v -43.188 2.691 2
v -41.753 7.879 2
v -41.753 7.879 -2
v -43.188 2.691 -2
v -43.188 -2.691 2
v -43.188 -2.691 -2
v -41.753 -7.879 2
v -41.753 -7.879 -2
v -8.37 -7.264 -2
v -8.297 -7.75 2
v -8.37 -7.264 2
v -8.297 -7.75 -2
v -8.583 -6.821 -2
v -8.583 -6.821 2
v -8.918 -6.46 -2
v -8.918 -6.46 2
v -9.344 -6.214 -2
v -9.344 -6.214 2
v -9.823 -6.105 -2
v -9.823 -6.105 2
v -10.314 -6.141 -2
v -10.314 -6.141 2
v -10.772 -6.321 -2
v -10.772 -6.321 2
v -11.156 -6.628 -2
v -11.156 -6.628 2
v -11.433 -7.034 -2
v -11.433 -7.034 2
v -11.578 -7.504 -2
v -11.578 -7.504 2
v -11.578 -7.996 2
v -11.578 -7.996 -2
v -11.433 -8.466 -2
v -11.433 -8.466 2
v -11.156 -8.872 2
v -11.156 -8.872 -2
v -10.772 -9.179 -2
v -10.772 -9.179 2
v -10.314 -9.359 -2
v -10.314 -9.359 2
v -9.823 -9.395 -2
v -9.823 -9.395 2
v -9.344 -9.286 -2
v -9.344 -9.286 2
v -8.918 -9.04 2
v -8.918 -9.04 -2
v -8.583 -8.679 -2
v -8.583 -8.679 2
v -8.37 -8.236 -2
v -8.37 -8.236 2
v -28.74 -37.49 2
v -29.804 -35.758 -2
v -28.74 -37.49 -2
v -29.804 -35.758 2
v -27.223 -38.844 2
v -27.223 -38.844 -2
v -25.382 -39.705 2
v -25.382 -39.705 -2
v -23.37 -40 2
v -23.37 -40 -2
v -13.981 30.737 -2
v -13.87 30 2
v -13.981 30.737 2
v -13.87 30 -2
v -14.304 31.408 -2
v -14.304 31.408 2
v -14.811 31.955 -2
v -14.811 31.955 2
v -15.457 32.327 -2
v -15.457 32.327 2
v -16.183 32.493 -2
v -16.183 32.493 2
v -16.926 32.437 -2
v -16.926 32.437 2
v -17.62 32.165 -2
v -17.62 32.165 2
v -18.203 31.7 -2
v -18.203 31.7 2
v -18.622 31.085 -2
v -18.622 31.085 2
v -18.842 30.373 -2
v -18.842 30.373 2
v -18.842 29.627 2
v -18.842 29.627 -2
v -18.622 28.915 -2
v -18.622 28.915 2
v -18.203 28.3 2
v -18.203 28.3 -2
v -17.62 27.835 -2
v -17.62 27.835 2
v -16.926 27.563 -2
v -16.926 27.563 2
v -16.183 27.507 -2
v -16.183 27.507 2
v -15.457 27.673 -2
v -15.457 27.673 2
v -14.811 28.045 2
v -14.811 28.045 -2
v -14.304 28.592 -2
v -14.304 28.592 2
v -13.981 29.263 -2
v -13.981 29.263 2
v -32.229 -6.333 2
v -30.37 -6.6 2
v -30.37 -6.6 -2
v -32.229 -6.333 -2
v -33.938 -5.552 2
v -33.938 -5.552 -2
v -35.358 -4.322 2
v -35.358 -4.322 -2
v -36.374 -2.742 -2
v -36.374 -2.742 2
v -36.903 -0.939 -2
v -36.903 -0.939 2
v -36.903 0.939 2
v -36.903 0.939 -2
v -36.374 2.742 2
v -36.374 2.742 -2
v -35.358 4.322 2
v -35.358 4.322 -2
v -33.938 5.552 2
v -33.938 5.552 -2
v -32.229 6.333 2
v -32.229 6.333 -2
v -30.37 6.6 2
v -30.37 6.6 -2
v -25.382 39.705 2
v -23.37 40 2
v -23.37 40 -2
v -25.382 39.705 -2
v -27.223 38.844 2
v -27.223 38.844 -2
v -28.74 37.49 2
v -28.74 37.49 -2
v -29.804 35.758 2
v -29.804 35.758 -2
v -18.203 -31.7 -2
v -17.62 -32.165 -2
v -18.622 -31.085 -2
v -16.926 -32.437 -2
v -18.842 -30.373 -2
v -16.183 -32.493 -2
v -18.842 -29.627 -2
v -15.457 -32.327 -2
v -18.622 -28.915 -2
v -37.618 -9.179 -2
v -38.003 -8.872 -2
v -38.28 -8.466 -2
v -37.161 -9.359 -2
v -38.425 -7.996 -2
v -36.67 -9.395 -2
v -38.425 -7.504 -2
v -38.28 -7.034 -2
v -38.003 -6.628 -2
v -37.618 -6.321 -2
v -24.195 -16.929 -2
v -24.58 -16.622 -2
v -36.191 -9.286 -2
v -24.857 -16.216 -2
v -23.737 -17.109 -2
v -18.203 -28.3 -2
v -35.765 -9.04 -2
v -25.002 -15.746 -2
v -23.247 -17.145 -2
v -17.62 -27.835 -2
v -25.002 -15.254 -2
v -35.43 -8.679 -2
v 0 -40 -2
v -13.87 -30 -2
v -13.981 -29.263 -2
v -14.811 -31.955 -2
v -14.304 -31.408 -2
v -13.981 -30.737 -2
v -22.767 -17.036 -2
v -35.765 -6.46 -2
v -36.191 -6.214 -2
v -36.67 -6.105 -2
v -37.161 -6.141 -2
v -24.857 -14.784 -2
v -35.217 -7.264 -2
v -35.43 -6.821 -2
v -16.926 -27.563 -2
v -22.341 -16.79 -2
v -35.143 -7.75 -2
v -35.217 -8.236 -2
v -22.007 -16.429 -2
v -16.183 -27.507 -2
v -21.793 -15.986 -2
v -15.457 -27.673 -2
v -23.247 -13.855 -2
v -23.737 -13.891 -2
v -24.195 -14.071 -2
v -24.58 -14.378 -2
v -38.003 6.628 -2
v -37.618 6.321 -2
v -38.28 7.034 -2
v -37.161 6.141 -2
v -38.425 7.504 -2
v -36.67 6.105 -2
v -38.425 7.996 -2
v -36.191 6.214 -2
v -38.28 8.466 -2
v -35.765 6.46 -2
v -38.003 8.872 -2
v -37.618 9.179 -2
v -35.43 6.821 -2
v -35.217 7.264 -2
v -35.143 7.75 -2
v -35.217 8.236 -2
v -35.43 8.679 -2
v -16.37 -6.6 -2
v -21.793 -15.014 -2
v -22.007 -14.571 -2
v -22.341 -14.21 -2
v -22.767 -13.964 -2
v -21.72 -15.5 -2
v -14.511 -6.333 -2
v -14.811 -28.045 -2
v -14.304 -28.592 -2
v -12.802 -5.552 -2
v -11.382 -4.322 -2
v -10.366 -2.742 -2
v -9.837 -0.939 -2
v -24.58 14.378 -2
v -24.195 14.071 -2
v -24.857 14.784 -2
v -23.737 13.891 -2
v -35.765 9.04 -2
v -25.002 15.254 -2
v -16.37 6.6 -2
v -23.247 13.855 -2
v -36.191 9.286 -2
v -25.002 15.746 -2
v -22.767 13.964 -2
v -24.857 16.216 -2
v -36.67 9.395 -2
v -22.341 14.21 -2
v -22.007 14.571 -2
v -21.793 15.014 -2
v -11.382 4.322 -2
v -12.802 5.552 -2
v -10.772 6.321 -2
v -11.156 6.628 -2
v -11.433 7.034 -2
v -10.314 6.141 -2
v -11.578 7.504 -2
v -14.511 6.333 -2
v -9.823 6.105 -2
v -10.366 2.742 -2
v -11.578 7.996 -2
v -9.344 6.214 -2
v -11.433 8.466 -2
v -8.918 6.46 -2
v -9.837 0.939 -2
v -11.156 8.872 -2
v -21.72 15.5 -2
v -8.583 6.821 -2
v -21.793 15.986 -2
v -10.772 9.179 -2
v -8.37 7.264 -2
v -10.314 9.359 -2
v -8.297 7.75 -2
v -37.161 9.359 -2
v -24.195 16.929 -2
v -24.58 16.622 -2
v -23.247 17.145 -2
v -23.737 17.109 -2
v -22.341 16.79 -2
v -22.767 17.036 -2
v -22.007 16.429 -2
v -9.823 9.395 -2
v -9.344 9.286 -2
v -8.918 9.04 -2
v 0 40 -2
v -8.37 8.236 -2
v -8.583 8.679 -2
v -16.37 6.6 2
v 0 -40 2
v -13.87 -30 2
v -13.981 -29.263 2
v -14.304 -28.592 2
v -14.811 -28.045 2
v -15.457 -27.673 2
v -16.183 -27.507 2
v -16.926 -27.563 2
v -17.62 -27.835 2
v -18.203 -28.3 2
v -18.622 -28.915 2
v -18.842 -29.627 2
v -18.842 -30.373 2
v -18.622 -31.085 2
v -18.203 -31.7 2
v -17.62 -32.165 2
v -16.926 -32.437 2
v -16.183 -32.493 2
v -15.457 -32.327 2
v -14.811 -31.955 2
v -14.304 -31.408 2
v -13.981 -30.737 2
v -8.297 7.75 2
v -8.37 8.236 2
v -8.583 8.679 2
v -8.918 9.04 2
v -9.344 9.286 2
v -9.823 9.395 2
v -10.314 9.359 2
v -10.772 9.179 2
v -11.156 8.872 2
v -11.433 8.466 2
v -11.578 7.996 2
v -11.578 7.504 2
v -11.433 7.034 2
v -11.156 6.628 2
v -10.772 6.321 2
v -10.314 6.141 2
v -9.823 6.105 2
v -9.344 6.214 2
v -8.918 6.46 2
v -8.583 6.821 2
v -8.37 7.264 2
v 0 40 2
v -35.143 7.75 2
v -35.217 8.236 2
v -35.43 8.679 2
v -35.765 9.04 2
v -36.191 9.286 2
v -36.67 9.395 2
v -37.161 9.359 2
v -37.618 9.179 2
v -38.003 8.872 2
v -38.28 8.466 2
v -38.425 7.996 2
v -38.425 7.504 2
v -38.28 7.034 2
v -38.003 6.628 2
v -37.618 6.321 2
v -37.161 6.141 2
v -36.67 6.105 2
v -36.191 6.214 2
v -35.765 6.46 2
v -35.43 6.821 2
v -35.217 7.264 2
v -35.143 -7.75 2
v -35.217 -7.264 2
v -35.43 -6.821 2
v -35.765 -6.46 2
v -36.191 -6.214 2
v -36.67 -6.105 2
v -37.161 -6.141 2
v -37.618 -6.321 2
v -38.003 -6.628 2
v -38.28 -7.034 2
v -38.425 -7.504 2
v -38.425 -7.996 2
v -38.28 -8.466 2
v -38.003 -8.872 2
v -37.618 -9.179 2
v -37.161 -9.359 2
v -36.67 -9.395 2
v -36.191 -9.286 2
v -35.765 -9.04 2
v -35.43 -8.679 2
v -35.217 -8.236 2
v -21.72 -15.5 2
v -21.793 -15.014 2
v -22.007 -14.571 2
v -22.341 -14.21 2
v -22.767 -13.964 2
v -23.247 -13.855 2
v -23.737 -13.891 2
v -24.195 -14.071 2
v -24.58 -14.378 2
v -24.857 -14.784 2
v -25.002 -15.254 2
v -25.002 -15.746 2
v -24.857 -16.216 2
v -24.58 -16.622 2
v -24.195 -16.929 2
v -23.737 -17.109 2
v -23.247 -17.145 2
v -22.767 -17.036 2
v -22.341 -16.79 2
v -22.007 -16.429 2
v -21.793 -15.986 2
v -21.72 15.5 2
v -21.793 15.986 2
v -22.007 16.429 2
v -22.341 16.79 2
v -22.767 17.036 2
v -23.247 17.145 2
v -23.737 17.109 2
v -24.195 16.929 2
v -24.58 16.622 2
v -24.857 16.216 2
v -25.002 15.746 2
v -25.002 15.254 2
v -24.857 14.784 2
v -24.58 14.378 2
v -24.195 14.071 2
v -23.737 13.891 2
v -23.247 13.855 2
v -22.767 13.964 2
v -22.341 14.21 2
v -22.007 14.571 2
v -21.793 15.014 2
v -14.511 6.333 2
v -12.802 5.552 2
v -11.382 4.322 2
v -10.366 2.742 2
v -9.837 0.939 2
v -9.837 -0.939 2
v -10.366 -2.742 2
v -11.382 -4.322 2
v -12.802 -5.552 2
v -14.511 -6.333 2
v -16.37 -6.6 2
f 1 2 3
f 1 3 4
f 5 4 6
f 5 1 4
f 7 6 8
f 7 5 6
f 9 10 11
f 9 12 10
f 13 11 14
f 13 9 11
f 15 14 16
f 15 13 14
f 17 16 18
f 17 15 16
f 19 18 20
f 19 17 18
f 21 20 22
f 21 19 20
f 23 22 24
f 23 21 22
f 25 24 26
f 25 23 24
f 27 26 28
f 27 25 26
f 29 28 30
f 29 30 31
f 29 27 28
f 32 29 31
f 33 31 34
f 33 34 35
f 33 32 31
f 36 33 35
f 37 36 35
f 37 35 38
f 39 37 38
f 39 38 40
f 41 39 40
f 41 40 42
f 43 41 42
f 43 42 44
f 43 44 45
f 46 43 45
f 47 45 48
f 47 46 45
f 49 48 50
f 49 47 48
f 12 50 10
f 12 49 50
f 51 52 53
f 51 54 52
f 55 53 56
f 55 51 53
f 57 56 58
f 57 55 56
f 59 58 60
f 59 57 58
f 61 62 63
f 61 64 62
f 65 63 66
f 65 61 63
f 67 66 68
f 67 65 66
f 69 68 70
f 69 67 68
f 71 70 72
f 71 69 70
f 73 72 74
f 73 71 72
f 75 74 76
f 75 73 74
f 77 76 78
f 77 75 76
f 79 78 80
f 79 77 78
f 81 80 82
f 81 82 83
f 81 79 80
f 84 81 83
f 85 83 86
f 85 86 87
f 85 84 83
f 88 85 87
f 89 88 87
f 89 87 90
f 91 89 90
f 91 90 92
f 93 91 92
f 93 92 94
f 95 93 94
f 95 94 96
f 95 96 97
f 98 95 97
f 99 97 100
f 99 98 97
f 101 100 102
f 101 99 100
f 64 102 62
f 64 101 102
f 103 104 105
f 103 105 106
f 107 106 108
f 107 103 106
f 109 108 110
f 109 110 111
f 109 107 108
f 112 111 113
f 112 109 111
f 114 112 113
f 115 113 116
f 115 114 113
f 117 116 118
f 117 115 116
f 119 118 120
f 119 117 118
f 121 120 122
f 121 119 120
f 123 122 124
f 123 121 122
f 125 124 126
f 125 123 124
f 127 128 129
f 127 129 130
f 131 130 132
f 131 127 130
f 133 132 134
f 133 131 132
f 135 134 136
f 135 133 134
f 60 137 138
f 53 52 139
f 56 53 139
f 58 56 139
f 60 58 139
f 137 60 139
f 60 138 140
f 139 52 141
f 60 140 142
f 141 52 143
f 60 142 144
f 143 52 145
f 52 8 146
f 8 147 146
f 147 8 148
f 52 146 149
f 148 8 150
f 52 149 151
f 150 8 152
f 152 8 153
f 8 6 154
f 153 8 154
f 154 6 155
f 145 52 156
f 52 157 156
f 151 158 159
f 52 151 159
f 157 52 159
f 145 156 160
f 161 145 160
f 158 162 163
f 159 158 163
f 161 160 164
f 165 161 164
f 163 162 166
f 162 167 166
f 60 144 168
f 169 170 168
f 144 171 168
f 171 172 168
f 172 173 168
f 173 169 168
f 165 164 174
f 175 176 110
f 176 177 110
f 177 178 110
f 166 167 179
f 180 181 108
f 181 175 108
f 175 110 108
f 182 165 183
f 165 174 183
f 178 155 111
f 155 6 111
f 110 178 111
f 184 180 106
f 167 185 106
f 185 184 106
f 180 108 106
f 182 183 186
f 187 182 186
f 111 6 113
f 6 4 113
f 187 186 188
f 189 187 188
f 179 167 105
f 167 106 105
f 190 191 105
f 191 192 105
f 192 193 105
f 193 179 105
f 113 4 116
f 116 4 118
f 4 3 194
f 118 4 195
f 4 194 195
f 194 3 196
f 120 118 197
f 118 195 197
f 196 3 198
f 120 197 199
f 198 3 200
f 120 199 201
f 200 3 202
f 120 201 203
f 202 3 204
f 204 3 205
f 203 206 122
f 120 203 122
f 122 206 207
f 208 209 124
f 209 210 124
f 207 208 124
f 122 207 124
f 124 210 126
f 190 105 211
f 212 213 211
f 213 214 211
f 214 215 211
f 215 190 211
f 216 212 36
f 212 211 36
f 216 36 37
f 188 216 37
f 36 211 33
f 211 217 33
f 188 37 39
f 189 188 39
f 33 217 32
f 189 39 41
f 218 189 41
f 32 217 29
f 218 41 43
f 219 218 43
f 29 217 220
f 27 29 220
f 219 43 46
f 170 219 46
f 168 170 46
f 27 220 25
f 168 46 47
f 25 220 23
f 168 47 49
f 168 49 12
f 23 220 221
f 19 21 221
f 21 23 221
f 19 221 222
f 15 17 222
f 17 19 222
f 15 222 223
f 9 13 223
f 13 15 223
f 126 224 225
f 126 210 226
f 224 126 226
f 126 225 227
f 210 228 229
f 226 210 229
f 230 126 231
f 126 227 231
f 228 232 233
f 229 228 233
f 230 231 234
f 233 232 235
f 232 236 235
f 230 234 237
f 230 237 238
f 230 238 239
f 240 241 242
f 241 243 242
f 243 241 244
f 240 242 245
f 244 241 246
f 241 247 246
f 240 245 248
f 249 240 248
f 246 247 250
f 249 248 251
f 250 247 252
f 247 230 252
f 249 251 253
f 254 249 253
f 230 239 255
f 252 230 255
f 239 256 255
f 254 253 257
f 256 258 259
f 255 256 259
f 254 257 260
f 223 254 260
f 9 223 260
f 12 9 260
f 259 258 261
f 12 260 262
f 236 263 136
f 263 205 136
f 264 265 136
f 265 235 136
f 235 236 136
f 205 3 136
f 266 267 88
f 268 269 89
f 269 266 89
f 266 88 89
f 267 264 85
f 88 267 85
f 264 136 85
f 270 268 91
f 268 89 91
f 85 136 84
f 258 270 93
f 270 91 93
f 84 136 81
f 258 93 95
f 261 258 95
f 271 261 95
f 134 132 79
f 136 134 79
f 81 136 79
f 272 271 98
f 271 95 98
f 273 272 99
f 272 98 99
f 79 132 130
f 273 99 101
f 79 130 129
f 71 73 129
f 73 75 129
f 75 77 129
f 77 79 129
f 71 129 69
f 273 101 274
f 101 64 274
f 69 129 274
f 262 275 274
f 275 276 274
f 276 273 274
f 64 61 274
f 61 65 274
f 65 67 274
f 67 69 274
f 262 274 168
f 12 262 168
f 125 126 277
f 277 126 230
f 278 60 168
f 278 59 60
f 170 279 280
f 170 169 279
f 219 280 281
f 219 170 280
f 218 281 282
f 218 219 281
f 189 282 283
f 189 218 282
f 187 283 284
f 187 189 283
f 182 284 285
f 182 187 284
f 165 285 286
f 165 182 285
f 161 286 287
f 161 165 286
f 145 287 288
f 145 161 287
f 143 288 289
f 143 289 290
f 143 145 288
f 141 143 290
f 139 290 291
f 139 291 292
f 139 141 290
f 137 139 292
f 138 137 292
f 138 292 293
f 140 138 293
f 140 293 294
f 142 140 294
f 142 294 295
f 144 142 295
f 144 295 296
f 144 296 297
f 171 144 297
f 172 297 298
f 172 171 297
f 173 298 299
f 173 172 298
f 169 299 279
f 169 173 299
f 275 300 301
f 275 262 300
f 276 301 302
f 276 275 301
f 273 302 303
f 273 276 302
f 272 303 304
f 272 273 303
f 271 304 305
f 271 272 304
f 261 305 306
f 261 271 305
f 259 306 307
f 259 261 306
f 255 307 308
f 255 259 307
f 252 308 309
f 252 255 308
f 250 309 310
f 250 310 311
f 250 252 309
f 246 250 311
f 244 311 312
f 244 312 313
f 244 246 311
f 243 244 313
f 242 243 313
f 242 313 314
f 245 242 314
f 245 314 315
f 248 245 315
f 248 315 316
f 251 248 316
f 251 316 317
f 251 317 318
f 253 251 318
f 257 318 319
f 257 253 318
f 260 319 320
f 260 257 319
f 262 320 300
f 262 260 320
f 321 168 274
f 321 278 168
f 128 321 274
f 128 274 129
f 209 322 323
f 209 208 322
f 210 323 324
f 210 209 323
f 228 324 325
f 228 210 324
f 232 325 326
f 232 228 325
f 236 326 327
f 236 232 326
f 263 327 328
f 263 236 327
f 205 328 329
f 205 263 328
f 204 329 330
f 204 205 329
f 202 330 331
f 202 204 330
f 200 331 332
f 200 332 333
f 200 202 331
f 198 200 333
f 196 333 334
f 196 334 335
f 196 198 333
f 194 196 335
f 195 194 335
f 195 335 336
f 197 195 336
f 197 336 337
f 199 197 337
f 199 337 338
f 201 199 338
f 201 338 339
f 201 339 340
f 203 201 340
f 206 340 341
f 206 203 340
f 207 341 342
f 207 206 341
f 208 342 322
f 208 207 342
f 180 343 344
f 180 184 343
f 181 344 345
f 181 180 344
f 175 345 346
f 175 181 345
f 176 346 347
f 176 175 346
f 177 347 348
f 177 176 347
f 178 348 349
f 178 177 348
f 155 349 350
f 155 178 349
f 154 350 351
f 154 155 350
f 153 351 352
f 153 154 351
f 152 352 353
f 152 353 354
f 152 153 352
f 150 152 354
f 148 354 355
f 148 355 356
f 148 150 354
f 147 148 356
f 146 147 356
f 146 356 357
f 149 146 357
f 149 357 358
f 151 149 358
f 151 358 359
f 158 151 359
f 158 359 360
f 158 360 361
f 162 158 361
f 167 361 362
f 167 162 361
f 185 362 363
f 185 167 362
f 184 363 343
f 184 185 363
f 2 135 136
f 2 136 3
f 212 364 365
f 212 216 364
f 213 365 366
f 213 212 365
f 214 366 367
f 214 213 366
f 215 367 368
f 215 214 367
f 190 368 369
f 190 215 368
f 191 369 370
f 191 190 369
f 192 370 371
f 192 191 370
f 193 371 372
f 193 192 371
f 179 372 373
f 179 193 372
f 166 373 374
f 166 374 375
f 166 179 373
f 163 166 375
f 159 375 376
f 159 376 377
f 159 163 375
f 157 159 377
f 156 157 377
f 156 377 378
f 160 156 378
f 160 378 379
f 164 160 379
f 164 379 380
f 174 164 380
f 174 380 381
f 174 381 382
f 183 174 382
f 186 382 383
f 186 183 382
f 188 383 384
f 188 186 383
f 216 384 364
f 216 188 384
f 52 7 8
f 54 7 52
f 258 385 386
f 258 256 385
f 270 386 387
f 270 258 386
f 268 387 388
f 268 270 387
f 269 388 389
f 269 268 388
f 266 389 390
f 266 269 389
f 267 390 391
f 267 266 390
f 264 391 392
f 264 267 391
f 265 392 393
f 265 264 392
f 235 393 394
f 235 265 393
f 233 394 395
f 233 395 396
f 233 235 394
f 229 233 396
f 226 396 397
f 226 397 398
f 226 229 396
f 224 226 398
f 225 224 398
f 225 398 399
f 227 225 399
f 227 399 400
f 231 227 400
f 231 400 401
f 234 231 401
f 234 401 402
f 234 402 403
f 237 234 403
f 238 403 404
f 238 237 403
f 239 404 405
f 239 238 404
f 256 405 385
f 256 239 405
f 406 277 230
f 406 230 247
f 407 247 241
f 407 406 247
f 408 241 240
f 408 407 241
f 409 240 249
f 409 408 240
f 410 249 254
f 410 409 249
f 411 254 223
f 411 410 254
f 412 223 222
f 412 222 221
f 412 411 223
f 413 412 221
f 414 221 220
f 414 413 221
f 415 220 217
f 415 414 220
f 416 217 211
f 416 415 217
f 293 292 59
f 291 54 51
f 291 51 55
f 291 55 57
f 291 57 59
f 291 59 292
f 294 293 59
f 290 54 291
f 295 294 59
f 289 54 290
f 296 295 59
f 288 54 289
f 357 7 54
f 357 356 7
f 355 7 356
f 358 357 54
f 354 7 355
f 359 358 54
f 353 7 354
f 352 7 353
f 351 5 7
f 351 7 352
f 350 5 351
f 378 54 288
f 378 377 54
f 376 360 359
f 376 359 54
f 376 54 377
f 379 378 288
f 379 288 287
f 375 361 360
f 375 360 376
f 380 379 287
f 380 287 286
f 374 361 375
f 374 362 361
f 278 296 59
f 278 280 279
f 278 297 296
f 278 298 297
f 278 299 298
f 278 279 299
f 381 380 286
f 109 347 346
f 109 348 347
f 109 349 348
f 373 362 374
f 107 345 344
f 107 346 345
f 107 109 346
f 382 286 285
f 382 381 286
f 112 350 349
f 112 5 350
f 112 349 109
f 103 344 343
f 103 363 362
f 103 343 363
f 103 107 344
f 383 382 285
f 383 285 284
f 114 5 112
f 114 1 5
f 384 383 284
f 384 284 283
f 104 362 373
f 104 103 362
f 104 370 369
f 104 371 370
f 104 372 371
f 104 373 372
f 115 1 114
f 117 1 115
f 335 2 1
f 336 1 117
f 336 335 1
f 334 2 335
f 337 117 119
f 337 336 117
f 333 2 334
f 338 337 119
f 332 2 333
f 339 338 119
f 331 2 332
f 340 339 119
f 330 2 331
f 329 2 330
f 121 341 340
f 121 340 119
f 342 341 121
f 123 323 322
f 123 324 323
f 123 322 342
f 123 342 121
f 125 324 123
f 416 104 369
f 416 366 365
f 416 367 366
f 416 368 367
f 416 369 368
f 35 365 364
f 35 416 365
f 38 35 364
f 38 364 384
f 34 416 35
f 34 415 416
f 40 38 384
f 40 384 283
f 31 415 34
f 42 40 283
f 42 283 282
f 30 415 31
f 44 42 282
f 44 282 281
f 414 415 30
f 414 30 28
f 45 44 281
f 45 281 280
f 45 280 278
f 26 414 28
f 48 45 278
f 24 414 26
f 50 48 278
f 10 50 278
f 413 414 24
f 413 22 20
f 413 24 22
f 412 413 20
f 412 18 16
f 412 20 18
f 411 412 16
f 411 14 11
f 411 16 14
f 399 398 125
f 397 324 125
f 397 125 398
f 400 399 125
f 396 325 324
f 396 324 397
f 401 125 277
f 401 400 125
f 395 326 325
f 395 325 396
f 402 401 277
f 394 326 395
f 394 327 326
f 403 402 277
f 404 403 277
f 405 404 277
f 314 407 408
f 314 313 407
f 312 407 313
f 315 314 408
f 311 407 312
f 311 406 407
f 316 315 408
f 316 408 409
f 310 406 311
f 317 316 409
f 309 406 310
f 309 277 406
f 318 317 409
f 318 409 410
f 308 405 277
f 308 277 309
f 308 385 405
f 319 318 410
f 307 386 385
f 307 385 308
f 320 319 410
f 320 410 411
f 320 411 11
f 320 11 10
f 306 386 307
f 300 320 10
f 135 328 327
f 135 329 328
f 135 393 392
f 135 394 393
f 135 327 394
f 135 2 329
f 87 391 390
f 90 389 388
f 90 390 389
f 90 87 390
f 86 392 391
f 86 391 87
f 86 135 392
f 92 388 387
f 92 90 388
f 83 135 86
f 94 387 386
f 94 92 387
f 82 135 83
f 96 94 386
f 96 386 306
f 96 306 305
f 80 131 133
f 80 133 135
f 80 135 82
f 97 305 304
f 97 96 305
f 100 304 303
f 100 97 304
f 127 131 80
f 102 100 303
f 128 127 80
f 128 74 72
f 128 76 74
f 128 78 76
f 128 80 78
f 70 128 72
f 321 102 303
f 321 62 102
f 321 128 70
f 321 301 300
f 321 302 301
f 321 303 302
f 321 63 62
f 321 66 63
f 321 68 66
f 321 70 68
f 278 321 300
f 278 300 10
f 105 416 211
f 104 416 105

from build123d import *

# Parameters (mm, degrees)
SKETCH1_R           = 2.5
SKETCH1_R_2         = 1.65
BOSS_EXTRUDE1_DEPTH = 2


with BuildPart() as part:
    # Sketch1 → Boss-Extrude1 (new, symmetric)
    with BuildSketch(Plane.XY):
        with BuildLine():
            Line((0, -40), (0, 40))
            Line((0, 40), (-23.37, 40))
            ThreePointArc((-23.37, 40), (-27.223373178, 38.84392977), (-29.803954922, 35.757575758))
            Line((-29.803954922, 35.757575758), (-41.752728349, 7.878787879))
            ThreePointArc((-41.752728349, 7.878787879), (-43.37, 0), (-41.752728349, -7.878787879))
            Line((-41.752728349, -7.878787879), (-29.803954922, -35.757575758))
            ThreePointArc((-29.803954922, -35.757575758), (-27.223373178, -38.84392977), (-23.37, -40))
            Line((-23.37, -40), (0, -40))
        make_face()
        with Locations((-16.37, 30)):
            Circle(SKETCH1_R, mode=Mode.SUBTRACT)
        with Locations((-16.37, -30)):
            Circle(SKETCH1_R, mode=Mode.SUBTRACT)
        with Locations((-23.37, -15.5)):
            Circle(SKETCH1_R_2, mode=Mode.SUBTRACT)
        with Locations((-36.793393759, -7.75)):
            Circle(SKETCH1_R_2, mode=Mode.SUBTRACT)
        with Locations((-36.793393759, 7.75)):
            Circle(SKETCH1_R_2, mode=Mode.SUBTRACT)
        with Locations((-23.37, 15.5)):
            Circle(SKETCH1_R_2, mode=Mode.SUBTRACT)
        with Locations((-9.946606241, 7.75)):
            Circle(SKETCH1_R_2, mode=Mode.SUBTRACT)
        with Locations((-9.946606241, -7.75)):
            Circle(SKETCH1_R_2, mode=Mode.SUBTRACT)
        with BuildLine():
            Line((-30.37, 6.6), (-16.37, 6.6))
            ThreePointArc((-16.37, 6.6), (-9.77, 0), (-16.37, -6.6))
            Line((-16.37, -6.6), (-30.37, -6.6))
            ThreePointArc((-30.37, -6.6), (-36.97, 0), (-30.37, 6.6))
        make_face(mode=Mode.SUBTRACT)
    extrude(amount=BOSS_EXTRUDE1_DEPTH, both=True)


solid = part.part
